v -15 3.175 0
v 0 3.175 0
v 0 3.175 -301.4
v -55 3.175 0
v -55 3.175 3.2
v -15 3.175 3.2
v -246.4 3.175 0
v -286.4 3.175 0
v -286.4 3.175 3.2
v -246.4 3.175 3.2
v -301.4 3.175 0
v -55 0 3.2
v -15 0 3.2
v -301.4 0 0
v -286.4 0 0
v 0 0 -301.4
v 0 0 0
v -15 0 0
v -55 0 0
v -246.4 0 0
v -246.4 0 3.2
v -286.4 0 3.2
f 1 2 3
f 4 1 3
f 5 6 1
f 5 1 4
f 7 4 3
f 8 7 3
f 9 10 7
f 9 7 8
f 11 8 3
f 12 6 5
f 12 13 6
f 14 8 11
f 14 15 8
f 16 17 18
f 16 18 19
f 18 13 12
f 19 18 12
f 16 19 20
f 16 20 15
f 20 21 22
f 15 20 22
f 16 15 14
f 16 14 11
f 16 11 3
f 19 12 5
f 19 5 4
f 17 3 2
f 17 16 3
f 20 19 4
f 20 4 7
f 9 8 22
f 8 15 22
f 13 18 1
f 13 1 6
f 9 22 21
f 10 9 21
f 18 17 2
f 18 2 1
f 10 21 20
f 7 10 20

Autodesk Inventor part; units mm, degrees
ref_plane "YZ Plane" through (0, 0, 0) normal (1, 0, 0) x (0, 1, 0)
ref_plane "XZ Plane" through (0, 0, 0) normal (0, 1, 0) x (-1, 0, 0)
ref_plane "XY Plane" through (0, 0, 0) normal (0, 0, 1) x (1, 0, 0)
sketch "Sketch1" plane through (0, 0, 0) normal (0, 1, 0) x (-1, 0, 0)
  line L0 (0, 0) -> (301.4, 0)
  line L1 (301.4, 0) -> (42.4, -259)
  line L2 (42.4, -259) -> (0, -301.4)
  line L3 (0, -301.4) -> (0, 0)
  line L4 (301.4, 0) -> (286.4, 0)
  line L5 (286.4, 0) -> (286.4, 3.2)
  line L6 (286.4, 3.2) -> (246.4, 3.2)
  line L7 (246.4, 3.2) -> (246.4, 0)
  line L8 (0, 0) -> (15, 0)
  line L9 (15, 0) -> (15, 3.2)
  line L10 (15, 3.2) -> (55, 3.2)
  line L11 (55, 3.2) -> (55, 0)
  line L12 (55, 0) -> (15, 0)
  dimension "d0" = 301.4
  dimension "d1" = 45
  dimension "d2" = 15
  dimension "d3" = 3.2
  dimension "d4" = 40
  dimension "d5" = 15
  dimension "d6" = 40
extrude "Extrusion1" add sketch "Sketch1" along normal blind 3.175
properties part number "Trebuchet V1 - Truss Support"
